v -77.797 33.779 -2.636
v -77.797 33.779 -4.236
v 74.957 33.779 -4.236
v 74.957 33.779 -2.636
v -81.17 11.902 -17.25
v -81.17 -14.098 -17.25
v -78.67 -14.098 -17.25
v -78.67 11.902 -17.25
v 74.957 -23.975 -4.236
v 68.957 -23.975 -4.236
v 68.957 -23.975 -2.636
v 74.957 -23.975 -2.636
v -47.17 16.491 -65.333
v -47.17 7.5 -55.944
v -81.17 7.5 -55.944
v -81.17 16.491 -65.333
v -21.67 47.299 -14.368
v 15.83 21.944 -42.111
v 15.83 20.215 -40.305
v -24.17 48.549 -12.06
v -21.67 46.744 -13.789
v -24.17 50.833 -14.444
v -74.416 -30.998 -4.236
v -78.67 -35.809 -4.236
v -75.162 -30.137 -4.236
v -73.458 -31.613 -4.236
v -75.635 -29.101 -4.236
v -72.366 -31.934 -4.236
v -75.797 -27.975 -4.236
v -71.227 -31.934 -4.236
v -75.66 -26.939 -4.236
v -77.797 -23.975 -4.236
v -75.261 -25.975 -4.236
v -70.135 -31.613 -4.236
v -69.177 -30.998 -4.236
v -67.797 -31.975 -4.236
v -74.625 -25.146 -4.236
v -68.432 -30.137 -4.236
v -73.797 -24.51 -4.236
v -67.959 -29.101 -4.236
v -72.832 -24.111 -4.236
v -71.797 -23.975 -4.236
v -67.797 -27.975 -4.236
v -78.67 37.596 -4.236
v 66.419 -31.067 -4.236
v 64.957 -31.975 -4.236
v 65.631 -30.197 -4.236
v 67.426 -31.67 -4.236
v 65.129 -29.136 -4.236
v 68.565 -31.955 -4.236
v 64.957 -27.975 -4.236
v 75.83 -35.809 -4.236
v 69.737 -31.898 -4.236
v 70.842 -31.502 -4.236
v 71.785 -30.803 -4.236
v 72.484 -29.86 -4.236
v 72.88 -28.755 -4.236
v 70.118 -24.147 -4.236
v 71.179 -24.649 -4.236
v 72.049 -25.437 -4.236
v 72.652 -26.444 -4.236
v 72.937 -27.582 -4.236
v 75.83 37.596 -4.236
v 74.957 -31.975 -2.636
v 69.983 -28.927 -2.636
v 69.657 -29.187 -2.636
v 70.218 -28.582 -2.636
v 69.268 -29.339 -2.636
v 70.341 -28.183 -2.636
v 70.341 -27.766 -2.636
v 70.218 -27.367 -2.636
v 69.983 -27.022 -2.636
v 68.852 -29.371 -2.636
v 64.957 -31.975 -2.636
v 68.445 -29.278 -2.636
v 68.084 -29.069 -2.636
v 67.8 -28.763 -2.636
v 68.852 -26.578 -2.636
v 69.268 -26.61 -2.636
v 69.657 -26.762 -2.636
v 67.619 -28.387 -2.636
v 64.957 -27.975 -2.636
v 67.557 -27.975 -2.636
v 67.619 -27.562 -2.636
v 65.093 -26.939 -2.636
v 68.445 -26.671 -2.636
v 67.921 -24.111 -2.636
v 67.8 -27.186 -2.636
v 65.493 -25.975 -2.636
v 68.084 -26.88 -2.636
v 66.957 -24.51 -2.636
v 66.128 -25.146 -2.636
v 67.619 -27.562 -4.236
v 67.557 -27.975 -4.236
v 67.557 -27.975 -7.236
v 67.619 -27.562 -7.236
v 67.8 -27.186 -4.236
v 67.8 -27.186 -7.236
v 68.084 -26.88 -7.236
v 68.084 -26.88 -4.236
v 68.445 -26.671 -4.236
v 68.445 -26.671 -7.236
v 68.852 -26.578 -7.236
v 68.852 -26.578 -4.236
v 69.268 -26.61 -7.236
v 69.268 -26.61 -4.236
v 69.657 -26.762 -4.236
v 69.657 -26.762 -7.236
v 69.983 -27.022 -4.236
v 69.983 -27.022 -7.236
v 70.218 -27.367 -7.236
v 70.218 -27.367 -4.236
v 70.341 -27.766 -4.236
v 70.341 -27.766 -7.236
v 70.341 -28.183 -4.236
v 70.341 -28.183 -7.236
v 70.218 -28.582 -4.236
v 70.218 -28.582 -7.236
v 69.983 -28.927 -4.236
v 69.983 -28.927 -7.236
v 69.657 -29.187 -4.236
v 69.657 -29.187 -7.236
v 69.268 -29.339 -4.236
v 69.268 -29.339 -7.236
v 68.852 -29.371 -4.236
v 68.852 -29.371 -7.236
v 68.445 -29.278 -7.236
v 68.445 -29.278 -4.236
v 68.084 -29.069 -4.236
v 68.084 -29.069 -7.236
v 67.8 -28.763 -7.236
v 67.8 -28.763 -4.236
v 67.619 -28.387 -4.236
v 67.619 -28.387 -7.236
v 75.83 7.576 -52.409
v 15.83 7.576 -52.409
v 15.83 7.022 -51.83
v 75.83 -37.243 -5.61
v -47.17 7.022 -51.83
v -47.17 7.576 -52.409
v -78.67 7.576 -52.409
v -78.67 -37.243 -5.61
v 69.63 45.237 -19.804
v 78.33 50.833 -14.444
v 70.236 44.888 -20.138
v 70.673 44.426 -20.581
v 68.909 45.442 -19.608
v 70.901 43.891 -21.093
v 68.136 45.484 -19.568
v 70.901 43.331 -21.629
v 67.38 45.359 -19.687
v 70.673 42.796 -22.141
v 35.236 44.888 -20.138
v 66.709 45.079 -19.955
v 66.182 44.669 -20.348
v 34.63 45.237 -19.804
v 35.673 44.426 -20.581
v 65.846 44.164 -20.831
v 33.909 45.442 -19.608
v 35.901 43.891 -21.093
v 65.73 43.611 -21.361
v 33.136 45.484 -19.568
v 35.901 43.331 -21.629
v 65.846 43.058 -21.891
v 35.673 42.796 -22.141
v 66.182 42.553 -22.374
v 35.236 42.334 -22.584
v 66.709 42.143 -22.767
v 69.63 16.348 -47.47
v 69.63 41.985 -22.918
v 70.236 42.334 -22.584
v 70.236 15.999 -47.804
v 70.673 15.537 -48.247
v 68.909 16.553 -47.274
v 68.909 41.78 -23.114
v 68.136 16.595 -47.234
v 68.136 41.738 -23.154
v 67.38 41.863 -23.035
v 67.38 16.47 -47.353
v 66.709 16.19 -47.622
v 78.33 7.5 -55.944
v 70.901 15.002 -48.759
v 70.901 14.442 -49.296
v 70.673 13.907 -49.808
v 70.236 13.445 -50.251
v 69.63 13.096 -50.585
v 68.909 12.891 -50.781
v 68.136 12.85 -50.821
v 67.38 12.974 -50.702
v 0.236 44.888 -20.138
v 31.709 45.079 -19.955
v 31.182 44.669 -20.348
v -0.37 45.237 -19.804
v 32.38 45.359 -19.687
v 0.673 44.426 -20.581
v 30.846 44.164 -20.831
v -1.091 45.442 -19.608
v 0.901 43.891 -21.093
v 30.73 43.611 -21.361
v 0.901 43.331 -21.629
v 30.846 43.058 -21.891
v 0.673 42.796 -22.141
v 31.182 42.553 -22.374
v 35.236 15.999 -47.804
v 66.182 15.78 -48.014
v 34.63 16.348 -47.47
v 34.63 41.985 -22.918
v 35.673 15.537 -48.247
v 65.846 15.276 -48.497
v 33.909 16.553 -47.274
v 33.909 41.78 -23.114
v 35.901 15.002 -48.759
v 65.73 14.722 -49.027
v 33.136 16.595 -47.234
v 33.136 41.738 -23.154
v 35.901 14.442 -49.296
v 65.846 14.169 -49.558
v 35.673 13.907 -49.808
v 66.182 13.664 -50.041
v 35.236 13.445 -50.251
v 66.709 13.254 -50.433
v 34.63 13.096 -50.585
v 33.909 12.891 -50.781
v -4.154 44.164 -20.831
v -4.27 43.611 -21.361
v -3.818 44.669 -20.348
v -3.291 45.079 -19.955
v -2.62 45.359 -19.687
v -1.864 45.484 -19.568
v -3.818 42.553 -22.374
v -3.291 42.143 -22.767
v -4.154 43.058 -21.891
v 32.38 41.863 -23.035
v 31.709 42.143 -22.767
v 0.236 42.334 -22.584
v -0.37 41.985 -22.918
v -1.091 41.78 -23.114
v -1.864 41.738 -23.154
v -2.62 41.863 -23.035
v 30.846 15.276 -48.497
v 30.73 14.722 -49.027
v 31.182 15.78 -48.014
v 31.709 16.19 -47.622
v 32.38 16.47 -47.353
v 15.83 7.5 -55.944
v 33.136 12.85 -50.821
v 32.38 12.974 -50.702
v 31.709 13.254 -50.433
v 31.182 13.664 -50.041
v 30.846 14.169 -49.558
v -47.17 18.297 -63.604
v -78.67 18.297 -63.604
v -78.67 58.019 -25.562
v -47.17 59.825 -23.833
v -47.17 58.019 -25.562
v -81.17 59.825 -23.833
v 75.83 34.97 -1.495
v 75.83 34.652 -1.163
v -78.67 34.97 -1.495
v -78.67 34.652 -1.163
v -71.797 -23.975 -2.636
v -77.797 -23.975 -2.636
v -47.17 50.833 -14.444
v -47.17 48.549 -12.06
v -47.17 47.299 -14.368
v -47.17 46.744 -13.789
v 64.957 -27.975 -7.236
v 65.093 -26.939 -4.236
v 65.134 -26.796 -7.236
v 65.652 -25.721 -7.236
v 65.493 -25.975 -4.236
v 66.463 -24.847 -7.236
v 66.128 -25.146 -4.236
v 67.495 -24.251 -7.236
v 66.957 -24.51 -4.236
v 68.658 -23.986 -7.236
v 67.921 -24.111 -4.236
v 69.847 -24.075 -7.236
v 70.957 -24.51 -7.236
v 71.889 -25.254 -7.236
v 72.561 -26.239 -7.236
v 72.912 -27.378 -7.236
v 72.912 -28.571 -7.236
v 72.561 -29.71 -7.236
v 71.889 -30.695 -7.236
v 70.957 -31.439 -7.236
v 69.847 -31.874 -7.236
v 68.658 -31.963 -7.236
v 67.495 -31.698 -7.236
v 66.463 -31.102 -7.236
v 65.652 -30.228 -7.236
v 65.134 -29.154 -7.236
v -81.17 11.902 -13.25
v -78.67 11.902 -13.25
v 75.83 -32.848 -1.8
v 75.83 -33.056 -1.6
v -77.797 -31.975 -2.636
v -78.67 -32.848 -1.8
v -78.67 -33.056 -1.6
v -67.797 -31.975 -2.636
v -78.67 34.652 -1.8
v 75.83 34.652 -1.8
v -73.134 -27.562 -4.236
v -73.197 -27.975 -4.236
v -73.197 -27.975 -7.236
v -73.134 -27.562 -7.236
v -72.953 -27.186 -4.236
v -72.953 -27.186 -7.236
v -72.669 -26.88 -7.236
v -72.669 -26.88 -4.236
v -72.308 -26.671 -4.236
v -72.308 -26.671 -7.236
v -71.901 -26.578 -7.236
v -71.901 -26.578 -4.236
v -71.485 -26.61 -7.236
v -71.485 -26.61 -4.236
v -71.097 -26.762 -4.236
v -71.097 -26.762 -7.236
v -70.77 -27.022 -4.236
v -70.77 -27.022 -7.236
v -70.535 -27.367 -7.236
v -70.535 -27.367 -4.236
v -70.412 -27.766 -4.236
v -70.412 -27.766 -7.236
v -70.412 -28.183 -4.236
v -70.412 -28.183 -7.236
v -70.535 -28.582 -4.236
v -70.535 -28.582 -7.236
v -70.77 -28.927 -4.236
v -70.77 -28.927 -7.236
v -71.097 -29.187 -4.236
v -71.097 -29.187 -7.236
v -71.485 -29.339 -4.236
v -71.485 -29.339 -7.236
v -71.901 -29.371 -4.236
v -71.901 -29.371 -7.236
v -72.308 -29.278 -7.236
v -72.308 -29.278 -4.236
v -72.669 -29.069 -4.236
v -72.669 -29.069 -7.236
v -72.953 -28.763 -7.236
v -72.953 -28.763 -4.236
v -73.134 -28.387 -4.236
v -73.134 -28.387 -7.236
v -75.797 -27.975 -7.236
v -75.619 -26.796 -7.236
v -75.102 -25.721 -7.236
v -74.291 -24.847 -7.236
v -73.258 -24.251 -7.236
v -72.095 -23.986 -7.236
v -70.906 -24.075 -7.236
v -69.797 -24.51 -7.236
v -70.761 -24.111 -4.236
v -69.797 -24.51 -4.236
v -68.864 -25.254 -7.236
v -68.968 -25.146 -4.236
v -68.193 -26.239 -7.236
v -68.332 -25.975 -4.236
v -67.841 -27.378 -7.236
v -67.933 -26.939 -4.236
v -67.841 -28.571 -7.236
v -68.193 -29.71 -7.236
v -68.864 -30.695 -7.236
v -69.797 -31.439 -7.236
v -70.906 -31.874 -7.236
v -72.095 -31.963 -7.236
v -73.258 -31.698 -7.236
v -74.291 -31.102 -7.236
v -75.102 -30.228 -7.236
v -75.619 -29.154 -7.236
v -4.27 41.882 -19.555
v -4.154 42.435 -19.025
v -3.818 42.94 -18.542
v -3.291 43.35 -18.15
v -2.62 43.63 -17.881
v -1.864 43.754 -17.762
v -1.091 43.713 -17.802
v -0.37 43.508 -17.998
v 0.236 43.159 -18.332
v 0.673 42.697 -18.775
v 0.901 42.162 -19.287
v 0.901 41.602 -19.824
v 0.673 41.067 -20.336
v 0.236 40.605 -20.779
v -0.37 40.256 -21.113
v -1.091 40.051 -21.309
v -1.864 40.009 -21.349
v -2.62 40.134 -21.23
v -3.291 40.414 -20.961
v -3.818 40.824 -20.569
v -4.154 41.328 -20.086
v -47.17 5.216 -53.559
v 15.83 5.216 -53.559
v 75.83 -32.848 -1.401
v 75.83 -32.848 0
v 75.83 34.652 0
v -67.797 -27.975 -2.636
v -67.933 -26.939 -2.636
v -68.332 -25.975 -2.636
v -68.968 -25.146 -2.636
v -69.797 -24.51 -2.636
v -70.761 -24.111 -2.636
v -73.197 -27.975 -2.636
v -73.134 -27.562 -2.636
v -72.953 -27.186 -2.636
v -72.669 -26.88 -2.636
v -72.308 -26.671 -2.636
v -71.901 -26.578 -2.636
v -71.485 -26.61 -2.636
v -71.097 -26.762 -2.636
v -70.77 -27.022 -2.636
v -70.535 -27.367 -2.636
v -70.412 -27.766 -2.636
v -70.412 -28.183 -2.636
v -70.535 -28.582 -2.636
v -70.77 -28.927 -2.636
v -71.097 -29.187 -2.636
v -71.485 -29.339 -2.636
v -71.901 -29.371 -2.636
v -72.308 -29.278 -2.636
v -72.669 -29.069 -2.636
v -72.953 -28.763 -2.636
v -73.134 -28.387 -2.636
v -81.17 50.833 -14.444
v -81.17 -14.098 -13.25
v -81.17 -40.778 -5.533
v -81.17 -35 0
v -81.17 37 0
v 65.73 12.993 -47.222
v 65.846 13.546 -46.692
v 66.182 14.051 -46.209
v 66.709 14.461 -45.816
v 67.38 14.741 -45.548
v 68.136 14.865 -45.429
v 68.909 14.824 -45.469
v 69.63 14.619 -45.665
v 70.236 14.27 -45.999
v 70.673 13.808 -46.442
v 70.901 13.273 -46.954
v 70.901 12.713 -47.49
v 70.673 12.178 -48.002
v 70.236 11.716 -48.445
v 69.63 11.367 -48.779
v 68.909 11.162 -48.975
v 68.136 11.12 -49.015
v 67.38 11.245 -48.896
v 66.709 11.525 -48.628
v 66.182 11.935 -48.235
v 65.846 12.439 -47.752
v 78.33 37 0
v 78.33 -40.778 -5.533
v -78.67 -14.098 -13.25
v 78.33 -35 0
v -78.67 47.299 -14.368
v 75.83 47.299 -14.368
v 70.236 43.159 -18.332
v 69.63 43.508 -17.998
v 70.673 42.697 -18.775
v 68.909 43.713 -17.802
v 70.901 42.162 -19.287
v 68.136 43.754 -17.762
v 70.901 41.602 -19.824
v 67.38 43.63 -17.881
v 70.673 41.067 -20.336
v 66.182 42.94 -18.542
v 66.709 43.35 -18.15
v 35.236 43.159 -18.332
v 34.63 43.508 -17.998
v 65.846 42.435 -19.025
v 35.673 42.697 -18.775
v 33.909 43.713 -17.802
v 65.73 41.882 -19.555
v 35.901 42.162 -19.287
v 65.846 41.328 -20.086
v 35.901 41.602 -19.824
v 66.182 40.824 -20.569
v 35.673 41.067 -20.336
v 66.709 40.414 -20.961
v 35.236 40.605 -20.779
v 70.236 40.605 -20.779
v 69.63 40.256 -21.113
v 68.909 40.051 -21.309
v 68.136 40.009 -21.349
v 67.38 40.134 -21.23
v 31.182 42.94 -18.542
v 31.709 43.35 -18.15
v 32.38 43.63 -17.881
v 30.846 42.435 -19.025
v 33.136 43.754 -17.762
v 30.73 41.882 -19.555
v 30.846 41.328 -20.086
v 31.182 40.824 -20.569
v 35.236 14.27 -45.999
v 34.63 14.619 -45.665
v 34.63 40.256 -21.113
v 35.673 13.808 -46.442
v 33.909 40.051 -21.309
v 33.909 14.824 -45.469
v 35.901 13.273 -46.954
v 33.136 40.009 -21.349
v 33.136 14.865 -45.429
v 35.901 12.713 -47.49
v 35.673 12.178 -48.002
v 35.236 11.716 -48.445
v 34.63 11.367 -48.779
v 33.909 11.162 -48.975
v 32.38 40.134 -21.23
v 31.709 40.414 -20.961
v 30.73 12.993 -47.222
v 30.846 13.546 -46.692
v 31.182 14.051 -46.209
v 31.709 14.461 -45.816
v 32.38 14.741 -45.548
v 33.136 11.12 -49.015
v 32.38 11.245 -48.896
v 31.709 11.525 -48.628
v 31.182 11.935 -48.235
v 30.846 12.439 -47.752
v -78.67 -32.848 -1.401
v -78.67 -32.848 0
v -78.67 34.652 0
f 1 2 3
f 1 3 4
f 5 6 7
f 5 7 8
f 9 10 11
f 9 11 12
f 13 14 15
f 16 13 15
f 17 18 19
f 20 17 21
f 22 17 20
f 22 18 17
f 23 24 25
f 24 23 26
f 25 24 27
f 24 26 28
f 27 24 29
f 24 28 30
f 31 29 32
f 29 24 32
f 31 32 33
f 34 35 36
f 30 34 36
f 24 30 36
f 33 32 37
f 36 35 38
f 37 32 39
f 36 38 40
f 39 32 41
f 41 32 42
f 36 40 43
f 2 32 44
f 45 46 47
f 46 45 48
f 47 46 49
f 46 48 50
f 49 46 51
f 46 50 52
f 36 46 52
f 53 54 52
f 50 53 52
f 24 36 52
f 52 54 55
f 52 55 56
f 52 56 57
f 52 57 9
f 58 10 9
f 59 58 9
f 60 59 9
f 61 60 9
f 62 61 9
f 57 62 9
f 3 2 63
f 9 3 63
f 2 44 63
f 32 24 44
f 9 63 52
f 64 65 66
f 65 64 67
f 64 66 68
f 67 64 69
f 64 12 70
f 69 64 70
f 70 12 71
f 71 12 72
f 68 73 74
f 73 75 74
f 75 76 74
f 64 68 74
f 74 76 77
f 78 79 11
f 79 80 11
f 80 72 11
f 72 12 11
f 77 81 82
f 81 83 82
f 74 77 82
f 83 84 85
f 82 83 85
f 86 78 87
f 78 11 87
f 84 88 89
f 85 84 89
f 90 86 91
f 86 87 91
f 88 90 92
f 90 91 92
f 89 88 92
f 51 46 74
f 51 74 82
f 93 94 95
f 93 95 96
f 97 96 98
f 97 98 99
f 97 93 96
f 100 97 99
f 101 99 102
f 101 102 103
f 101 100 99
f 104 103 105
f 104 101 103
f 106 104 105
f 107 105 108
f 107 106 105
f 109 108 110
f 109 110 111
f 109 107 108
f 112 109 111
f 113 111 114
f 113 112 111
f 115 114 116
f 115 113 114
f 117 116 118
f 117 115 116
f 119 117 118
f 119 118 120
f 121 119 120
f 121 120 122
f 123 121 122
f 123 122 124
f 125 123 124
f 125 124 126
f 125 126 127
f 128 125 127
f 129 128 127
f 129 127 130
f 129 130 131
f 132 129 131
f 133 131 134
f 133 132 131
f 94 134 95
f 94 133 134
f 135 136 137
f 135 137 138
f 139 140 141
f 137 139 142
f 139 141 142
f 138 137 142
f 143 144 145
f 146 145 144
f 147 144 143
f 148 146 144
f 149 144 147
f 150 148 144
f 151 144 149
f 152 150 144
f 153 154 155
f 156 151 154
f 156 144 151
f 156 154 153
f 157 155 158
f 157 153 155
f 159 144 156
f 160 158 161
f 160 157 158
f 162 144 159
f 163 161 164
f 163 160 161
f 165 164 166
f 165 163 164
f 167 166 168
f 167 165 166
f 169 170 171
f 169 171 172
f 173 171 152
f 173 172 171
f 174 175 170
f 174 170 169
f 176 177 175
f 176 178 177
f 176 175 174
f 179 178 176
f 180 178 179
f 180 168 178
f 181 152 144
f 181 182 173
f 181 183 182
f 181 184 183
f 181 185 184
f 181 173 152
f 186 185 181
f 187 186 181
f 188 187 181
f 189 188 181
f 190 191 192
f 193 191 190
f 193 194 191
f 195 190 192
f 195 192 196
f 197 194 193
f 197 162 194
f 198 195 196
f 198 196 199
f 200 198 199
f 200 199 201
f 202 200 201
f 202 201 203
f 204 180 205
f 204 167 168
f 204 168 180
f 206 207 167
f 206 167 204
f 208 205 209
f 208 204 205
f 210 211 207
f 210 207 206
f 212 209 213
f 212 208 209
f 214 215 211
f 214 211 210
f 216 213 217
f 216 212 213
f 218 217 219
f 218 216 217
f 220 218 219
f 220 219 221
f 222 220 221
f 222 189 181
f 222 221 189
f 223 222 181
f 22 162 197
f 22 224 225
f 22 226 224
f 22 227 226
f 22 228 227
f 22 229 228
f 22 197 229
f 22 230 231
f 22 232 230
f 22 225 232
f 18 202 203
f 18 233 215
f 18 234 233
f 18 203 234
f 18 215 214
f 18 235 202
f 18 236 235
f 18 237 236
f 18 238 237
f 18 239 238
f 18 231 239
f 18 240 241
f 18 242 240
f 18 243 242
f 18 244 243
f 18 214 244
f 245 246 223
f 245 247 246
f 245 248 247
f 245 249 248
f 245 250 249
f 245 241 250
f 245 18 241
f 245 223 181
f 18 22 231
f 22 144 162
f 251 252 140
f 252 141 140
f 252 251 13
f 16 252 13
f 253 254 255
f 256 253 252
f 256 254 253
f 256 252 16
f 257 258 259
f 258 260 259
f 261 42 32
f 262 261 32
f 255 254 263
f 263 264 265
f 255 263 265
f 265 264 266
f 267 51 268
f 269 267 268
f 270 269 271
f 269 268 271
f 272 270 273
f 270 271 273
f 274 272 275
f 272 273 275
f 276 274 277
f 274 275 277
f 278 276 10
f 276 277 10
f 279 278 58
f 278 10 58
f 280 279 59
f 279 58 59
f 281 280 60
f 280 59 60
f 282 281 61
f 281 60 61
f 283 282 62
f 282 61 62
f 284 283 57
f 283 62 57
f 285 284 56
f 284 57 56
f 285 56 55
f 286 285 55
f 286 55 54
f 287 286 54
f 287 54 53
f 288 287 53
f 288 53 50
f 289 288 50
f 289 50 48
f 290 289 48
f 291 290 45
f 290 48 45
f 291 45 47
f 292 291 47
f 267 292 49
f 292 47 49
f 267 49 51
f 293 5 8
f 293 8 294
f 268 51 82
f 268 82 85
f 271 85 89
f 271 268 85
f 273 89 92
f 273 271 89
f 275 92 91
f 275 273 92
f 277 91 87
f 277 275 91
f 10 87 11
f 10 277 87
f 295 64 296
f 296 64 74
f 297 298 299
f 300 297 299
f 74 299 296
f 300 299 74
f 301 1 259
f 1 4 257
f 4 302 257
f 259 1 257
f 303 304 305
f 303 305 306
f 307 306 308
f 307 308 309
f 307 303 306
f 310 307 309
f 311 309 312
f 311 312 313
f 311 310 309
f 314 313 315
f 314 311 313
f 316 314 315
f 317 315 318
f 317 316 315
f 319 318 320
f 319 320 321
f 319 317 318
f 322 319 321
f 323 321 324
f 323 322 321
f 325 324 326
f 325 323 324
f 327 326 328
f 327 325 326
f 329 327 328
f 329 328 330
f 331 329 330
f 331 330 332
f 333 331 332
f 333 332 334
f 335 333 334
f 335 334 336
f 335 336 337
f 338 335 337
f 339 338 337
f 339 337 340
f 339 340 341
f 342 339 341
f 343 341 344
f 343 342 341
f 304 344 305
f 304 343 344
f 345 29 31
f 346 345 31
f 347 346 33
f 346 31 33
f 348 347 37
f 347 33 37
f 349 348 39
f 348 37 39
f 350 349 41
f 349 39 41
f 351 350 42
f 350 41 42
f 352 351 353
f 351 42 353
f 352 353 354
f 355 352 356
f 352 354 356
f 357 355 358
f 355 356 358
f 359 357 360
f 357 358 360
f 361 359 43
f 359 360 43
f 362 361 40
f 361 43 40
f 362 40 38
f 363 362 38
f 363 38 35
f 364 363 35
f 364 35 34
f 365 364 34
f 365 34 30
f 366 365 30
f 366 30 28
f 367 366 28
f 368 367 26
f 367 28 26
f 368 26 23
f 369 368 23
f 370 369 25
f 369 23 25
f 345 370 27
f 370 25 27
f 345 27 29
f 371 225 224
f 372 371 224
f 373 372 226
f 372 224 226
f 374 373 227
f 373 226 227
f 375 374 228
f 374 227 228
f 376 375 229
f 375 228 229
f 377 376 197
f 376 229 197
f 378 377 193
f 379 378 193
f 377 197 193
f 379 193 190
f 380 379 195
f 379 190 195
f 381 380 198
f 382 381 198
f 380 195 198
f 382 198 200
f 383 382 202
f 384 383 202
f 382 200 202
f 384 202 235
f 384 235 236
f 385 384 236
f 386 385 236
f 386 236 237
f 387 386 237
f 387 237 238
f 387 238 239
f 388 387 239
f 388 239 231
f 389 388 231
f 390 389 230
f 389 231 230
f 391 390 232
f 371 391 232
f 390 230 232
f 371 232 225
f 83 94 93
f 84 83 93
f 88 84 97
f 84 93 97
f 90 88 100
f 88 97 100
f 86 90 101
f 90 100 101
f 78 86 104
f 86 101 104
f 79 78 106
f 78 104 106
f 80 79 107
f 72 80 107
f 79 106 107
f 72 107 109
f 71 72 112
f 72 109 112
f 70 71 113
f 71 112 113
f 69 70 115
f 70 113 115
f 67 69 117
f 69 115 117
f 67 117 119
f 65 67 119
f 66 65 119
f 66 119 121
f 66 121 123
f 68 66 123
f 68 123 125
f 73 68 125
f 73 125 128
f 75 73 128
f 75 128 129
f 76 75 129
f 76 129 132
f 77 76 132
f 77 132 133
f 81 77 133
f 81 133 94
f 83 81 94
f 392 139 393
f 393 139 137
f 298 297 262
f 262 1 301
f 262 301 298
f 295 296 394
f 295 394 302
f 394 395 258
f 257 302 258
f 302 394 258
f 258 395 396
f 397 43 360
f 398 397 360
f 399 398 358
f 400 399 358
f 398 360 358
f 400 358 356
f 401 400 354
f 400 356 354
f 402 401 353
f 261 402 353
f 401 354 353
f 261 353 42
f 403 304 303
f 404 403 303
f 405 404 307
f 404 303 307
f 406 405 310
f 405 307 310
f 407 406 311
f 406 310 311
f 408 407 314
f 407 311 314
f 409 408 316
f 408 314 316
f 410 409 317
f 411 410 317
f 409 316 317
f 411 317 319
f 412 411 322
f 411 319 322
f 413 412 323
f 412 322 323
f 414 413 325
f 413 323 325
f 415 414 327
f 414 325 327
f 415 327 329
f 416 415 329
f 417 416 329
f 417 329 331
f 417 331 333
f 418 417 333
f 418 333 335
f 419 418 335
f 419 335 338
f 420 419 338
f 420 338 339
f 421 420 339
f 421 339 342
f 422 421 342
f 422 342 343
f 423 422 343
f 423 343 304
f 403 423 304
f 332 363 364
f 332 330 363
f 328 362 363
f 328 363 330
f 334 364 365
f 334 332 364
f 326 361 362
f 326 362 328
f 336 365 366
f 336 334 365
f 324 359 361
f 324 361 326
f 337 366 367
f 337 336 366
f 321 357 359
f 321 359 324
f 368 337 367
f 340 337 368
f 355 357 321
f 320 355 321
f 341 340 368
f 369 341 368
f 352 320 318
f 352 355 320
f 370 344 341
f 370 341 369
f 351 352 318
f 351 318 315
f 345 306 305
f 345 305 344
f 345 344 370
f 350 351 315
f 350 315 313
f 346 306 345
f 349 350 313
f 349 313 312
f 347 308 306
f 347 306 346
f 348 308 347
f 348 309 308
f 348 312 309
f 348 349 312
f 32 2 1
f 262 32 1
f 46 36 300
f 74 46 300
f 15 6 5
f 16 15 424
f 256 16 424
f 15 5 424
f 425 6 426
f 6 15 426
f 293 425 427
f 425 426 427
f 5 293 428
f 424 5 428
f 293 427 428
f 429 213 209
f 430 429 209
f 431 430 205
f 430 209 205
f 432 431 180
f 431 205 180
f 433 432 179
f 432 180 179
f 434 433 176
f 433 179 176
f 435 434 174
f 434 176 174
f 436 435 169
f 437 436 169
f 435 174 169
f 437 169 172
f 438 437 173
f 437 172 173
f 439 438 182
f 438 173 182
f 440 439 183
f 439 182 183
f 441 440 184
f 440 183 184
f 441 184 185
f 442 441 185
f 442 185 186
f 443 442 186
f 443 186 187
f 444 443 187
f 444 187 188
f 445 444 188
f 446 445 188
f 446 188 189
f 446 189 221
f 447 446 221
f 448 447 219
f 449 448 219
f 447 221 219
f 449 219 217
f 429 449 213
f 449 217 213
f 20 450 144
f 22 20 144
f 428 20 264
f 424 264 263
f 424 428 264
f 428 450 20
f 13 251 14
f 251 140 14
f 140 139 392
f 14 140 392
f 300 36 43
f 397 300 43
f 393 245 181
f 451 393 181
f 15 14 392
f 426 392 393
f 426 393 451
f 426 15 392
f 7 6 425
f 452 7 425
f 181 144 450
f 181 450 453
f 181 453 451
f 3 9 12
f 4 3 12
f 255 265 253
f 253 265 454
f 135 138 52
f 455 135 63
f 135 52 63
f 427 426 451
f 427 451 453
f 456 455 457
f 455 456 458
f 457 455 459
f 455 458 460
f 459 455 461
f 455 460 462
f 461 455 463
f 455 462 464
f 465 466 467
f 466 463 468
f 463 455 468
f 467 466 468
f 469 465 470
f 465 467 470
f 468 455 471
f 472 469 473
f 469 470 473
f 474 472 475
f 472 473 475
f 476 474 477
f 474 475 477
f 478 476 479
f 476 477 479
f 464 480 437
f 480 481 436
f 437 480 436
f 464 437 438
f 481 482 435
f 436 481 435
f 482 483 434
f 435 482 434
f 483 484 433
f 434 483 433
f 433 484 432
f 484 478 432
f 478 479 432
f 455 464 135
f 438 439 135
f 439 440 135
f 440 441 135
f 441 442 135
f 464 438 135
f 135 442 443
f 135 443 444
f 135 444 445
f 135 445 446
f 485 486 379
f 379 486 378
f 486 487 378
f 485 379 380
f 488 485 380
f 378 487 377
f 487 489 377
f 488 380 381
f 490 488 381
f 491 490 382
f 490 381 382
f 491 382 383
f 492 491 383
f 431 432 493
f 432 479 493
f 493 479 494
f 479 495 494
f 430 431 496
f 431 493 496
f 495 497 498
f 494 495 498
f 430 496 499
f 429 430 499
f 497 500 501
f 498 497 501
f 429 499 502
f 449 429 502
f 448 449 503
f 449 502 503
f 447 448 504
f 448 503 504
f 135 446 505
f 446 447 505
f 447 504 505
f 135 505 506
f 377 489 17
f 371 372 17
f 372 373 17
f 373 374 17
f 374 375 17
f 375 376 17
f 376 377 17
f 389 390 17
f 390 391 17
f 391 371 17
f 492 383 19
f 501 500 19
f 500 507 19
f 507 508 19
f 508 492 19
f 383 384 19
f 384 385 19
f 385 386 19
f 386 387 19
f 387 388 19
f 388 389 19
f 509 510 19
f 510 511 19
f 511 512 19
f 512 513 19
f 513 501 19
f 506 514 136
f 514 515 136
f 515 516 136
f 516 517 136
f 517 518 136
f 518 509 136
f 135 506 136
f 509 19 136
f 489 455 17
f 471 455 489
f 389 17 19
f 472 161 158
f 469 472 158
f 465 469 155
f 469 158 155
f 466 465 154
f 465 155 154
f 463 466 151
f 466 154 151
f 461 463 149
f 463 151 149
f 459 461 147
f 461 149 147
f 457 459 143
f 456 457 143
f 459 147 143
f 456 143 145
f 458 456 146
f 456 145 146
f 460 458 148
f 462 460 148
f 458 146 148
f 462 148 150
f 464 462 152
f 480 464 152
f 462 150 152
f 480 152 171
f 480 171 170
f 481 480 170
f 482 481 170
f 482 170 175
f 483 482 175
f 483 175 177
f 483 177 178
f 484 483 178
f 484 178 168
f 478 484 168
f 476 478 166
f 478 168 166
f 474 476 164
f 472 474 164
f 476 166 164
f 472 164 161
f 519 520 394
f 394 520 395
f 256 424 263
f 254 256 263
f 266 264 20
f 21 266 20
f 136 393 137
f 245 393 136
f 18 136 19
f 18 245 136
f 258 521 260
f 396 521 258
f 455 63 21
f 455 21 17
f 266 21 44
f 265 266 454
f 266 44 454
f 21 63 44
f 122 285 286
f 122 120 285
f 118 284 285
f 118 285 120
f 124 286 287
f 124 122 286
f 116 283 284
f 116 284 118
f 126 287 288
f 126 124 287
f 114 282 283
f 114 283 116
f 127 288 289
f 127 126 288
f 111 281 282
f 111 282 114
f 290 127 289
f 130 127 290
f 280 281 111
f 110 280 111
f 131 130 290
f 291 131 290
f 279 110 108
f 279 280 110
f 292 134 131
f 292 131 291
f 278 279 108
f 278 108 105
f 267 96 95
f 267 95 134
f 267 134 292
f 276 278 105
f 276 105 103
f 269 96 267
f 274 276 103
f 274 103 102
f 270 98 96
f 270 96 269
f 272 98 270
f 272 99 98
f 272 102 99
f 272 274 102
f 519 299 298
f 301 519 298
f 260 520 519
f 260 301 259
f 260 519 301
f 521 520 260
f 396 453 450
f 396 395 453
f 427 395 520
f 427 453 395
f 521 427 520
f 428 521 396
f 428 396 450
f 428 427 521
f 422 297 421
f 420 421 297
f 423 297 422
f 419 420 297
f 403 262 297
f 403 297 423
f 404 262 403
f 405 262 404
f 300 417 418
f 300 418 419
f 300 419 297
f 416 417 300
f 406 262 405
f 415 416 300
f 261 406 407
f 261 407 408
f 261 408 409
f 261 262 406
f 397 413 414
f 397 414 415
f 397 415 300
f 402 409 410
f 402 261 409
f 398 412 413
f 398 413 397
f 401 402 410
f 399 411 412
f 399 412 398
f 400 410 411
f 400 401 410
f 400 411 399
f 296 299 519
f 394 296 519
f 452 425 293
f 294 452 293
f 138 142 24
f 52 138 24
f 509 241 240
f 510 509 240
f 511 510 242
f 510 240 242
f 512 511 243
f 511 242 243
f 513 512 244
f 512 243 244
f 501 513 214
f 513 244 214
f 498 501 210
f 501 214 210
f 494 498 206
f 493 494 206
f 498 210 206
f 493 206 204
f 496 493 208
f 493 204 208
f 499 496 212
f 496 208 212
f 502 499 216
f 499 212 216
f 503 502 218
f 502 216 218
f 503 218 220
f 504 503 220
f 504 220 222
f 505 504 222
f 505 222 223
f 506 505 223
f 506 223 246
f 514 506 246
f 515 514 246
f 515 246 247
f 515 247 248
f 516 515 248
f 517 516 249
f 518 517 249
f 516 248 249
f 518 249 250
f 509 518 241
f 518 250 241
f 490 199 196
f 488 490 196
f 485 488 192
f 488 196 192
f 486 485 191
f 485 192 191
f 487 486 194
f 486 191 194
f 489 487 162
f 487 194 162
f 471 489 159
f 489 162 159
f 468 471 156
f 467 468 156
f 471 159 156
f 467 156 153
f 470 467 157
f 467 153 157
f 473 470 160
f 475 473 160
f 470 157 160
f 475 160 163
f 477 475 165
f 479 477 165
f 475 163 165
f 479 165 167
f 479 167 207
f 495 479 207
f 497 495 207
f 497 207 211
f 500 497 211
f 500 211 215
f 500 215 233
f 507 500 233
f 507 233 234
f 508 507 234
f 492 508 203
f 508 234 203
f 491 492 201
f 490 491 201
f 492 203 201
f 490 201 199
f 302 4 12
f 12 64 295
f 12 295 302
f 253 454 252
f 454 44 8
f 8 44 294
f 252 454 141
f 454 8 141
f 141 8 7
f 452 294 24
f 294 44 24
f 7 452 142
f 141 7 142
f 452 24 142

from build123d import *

# Parameters (mm, degrees)
BOSS_EXTRUDE3_DEPTH = 159.5
SHELL1_T            = -2.5
SKETCH1_W           = 154.5
SKETCH1_H           = 67.5
CUT_EXTRUDE2_DEPTH  = 4
CUT_EXTRUDE1_REACH  = 161.5
SKETCH2_W           = 4
SKETCH2_H           = 26
SKETCH8_W           = 179.5
SKETCH8_H           = 111.610999554
SKETCH8_W_2         = 159.5
SKETCH8_H_2         = 91.610999554
CUT_EXTRUDE3_DEPTH  = 56.944109771
SKETCH10_W          = 31.5
SKETCH10_H          = 55
CUT_EXTRUDE4_DEPTH  = 2.5
BOSS_EXTRUDE4_DEPTH = 13
CUT_EXTRUDE5_DEPTH  = 3.302
SKETCH13_R          = 2.6
CUT_EXTRUDE6_DEPTH  = 2.5
BOSS_EXTRUDE5_DEPTH = 1.6
SKETCH15_R          = 4
SKETCH15_R_2        = 1.4
BOSS_EXTRUDE6_DEPTH = 3
CUT_EXTRUDE7_REACH  = 6.236
SKETCH15_2_R        = 1.4


with BuildPart() as part:
    # Sketch3 → Boss-Extrude3 (new body)
    with BuildSketch(Plane.YZ.offset(-81.169946448)):
        Polygon((37, 0), (50.833221776, -14.444444444), (7.499888442, -55.944109771), (-40.777777778, -5.53328871), (-35, 0), align=None)
    extrude(amount=BOSS_EXTRUDE3_DEPTH)

    # Shell1
    shell1_openings = [part.faces().sort_by_distance(p)[0] for p in [
        (-1.419946448, 1, 0),
    ]]
    offset(amount=SHELL1_T, openings=shell1_openings, kind=Kind.INTERSECTION)

    # Sketch1 → Cut-Extrude2 (cut)
    with BuildSketch(Plane.XY):
        with Locations((-1.419946448, 0.902066229)):
            Rectangle(SKETCH1_W, SKETCH1_H)
    extrude(amount=-CUT_EXTRUDE2_DEPTH, mode=Mode.SUBTRACT)

    # Sketch2 → Cut-Extrude1 (cut, up to next)
    with BuildSketch(Plane.ZY.offset(81.169946448), mode=Mode.PRIVATE) as cut_extrude1_sk1:
        with Locations((-15.25, -1.097933771)):
            Rectangle(SKETCH2_W, SKETCH2_H)
    cut_extrude1_tool1 = extrude(cut_extrude1_sk1.sketch, amount=-CUT_EXTRUDE1_REACH, mode=Mode.PRIVATE) & part.part
    add(cut_extrude1_tool1.solids().sort_by_distance((-81.169946, -1.097934, -15.25))[0], mode=Mode.SUBTRACT)

    # Sweep1: sweep along a path in Sketch6
    with BuildLine(Plane.XY.offset(-1.8)) as sweep1_path:
        Line((-78.669946448, 34.652066229), (75.830053552, 34.652066229))
        Line((75.830053552, 34.652066229), (75.830053552, -32.847933771))
        Line((75.830053552, -32.847933771), (-78.669946448, -32.847933771))
        Line((-78.669946448, -32.847933771), (-78.669946448, 34.652066229))
    # Sketch7 → Sweep1 (sweep)
    with BuildSketch(Plane.ZY.offset(-75.830053552)):
        Polygon((-1.356838972, 35.114808383), (-2.636411987, 33.778697272), (-4.236411987, 33.778697272), (-4.236411987, 37.872531068), align=None)
    sweep(path=sweep1_path.line, transition=Transition.RIGHT)

    # Sketch8 → Cut-Extrude3 (cut, through all)
    with BuildSketch(Plane.XY):
        with Locations((-1.419946448, 5.027721999)):
            Rectangle(SKETCH8_W, SKETCH8_H)
        with Locations((-1.419946448, 5.027721999)):
            Rectangle(SKETCH8_W_2, SKETCH8_H_2, mode=Mode.SUBTRACT)
    extrude(amount=-CUT_EXTRUDE3_DEPTH, mode=Mode.SUBTRACT)

    # Sketch10 → Cut-Extrude4 (cut)
    with BuildSketch(Plane(origin=(0, 31.533839059, -32.927165761), x_dir=(-1, 0, 0), z_dir=(0, 0.691661089, -0.722222222))):
        with Locations((62.919946448, -3.277777778)):
            Rectangle(SKETCH10_W, SKETCH10_H)
    extrude(amount=-CUT_EXTRUDE4_DEPTH, mode=Mode.SUBTRACT)

    # Sketch10<3> → Boss-Extrude4 (add)
    with BuildSketch(Plane(origin=(0, 31.533839059, -32.927165761), x_dir=(-1, 0, 0), z_dir=(0, 0.691661089, -0.722222222))):
        Polygon((78.669946448, 24.222222222), (78.669946448, -30.777777778), (47.169946448, -30.777777778), (47.169946448, -33.277777778), (81.169946448, -33.277777778), (81.169946448, 26.722222222), (47.169946448, 26.722222222), (47.169946448, 24.222222222), align=None)
    extrude(amount=BOSS_EXTRUDE4_DEPTH)

    # Sketch12 → Cut-Extrude5 (cut)
    with BuildSketch(Plane(origin=(0, 31.533839059, -32.927165761), x_dir=(-1, 0, 0), z_dir=(0, 0.691661089, -0.722222222))):
        Polygon((47.169946448, -33.277777778), (-15.830053552, -33.277777778), (-15.830053552, -13.277777778), (24.169946448, 26.722222222), (47.169946448, 26.722222222), align=None)
    extrude(amount=-CUT_EXTRUDE5_DEPTH, mode=Mode.SUBTRACT)

    # Sketch13 → Cut-Extrude6 (cut)
    with BuildSketch(Plane(origin=(0, 31.533839059, -32.927165761), x_dir=(-1, 0, 0), z_dir=(0, 0.691661089, -0.722222222))):
        with Locations((-68.330053552, -23.277777778)):
            Circle(SKETCH13_R)
        with Locations((-33.330053552, -23.277777778)):
            Circle(SKETCH13_R)
        with Locations((-33.330053552, 16.722222222)):
            Circle(SKETCH13_R)
        with Locations((1.669946448, 16.722222222)):
            Circle(SKETCH13_R)
        with Locations((-68.330053552, 16.722222222)):
            Circle(SKETCH13_R)
    extrude(amount=-CUT_EXTRUDE6_DEPTH, mode=Mode.SUBTRACT)

    # Sketch14 → Boss-Extrude5 (add)
    with BuildSketch(Plane(origin=(0, 0, -4.236411987), x_dir=(-1, 0, 0), z_dir=(0, 0, -1))):
        with BuildLine():
            Line((77.796577491, -31.974564814), (67.796577491, -31.974564814))
            Line((67.796577491, -31.974564814), (67.796577491, -27.974564814))
            ThreePointArc((67.796577491, -27.974564814), (68.968150366, -25.14613769), (71.796577491, -23.974564814))
            Line((71.796577491, -23.974564814), (77.796577491, -23.974564814))
            Line((77.796577491, -23.974564814), (77.796577491, -31.974564814))
        make_face()
        with BuildLine():
            Line((-74.956684595, -31.974564814), (-64.956684595, -31.974564814))
            Line((-64.956684595, -31.974564814), (-64.956684595, -27.974564814))
            ThreePointArc((-64.956684595, -27.974564814), (-66.12825747, -25.14613769), (-68.956684595, -23.974564814))
            Line((-68.956684595, -23.974564814), (-74.956684595, -23.974564814))
            Line((-74.956684595, -23.974564814), (-74.956684595, -31.974564814))
        make_face()
    extrude(amount=-BOSS_EXTRUDE5_DEPTH)

    # Sketch15 → Boss-Extrude6 (add)
    with BuildSketch(Plane(origin=(0, 0, -4.236411987), x_dir=(-1, 0, 0), z_dir=(0, 0, -1))):
        with Locations((71.796577491, -27.974564814)):
            Circle(SKETCH15_R)
        with Locations((71.796577491, -27.974564814)):
            Circle(SKETCH15_R_2, mode=Mode.SUBTRACT)
        with Locations((-68.956684595, -27.974564814)):
            Circle(SKETCH15_R)
        with Locations((-68.956684595, -27.974564814)):
            Circle(SKETCH15_R_2, mode=Mode.SUBTRACT)
    extrude(amount=BOSS_EXTRUDE6_DEPTH)

    # Sketch15<2> → Cut-Extrude7 (cut, up to next)
    with BuildSketch(Plane(origin=(0, 0, -4.236411987), x_dir=(-1, 0, 0), z_dir=(0, 0, -1)), mode=Mode.PRIVATE) as cut_extrude7_sk1:
        with Locations((71.796577491, -27.974564814)):
            Circle(SKETCH15_2_R)
    cut_extrude7_tool1 = extrude(cut_extrude7_sk1.sketch, amount=-CUT_EXTRUDE7_REACH, mode=Mode.PRIVATE) & part.part
    add(cut_extrude7_tool1.solids().sort_by_distance((-71.796577, -27.974565, -4.236412))[0], mode=Mode.SUBTRACT)
    # Sketch15<2> → Cut-Extrude7 (cut, up to next)
    with BuildSketch(Plane(origin=(0, 0, -4.236411987), x_dir=(-1, 0, 0), z_dir=(0, 0, -1)), mode=Mode.PRIVATE) as cut_extrude7_sk2:
        with Locations((-68.956684595, -27.974564814)):
            Circle(SKETCH15_2_R)
    cut_extrude7_tool2 = extrude(cut_extrude7_sk2.sketch, amount=-CUT_EXTRUDE7_REACH, mode=Mode.PRIVATE) & part.part
    add(cut_extrude7_tool2.solids().sort_by_distance((68.956685, -27.974565, -4.236412))[0], mode=Mode.SUBTRACT)


solid = part.part
